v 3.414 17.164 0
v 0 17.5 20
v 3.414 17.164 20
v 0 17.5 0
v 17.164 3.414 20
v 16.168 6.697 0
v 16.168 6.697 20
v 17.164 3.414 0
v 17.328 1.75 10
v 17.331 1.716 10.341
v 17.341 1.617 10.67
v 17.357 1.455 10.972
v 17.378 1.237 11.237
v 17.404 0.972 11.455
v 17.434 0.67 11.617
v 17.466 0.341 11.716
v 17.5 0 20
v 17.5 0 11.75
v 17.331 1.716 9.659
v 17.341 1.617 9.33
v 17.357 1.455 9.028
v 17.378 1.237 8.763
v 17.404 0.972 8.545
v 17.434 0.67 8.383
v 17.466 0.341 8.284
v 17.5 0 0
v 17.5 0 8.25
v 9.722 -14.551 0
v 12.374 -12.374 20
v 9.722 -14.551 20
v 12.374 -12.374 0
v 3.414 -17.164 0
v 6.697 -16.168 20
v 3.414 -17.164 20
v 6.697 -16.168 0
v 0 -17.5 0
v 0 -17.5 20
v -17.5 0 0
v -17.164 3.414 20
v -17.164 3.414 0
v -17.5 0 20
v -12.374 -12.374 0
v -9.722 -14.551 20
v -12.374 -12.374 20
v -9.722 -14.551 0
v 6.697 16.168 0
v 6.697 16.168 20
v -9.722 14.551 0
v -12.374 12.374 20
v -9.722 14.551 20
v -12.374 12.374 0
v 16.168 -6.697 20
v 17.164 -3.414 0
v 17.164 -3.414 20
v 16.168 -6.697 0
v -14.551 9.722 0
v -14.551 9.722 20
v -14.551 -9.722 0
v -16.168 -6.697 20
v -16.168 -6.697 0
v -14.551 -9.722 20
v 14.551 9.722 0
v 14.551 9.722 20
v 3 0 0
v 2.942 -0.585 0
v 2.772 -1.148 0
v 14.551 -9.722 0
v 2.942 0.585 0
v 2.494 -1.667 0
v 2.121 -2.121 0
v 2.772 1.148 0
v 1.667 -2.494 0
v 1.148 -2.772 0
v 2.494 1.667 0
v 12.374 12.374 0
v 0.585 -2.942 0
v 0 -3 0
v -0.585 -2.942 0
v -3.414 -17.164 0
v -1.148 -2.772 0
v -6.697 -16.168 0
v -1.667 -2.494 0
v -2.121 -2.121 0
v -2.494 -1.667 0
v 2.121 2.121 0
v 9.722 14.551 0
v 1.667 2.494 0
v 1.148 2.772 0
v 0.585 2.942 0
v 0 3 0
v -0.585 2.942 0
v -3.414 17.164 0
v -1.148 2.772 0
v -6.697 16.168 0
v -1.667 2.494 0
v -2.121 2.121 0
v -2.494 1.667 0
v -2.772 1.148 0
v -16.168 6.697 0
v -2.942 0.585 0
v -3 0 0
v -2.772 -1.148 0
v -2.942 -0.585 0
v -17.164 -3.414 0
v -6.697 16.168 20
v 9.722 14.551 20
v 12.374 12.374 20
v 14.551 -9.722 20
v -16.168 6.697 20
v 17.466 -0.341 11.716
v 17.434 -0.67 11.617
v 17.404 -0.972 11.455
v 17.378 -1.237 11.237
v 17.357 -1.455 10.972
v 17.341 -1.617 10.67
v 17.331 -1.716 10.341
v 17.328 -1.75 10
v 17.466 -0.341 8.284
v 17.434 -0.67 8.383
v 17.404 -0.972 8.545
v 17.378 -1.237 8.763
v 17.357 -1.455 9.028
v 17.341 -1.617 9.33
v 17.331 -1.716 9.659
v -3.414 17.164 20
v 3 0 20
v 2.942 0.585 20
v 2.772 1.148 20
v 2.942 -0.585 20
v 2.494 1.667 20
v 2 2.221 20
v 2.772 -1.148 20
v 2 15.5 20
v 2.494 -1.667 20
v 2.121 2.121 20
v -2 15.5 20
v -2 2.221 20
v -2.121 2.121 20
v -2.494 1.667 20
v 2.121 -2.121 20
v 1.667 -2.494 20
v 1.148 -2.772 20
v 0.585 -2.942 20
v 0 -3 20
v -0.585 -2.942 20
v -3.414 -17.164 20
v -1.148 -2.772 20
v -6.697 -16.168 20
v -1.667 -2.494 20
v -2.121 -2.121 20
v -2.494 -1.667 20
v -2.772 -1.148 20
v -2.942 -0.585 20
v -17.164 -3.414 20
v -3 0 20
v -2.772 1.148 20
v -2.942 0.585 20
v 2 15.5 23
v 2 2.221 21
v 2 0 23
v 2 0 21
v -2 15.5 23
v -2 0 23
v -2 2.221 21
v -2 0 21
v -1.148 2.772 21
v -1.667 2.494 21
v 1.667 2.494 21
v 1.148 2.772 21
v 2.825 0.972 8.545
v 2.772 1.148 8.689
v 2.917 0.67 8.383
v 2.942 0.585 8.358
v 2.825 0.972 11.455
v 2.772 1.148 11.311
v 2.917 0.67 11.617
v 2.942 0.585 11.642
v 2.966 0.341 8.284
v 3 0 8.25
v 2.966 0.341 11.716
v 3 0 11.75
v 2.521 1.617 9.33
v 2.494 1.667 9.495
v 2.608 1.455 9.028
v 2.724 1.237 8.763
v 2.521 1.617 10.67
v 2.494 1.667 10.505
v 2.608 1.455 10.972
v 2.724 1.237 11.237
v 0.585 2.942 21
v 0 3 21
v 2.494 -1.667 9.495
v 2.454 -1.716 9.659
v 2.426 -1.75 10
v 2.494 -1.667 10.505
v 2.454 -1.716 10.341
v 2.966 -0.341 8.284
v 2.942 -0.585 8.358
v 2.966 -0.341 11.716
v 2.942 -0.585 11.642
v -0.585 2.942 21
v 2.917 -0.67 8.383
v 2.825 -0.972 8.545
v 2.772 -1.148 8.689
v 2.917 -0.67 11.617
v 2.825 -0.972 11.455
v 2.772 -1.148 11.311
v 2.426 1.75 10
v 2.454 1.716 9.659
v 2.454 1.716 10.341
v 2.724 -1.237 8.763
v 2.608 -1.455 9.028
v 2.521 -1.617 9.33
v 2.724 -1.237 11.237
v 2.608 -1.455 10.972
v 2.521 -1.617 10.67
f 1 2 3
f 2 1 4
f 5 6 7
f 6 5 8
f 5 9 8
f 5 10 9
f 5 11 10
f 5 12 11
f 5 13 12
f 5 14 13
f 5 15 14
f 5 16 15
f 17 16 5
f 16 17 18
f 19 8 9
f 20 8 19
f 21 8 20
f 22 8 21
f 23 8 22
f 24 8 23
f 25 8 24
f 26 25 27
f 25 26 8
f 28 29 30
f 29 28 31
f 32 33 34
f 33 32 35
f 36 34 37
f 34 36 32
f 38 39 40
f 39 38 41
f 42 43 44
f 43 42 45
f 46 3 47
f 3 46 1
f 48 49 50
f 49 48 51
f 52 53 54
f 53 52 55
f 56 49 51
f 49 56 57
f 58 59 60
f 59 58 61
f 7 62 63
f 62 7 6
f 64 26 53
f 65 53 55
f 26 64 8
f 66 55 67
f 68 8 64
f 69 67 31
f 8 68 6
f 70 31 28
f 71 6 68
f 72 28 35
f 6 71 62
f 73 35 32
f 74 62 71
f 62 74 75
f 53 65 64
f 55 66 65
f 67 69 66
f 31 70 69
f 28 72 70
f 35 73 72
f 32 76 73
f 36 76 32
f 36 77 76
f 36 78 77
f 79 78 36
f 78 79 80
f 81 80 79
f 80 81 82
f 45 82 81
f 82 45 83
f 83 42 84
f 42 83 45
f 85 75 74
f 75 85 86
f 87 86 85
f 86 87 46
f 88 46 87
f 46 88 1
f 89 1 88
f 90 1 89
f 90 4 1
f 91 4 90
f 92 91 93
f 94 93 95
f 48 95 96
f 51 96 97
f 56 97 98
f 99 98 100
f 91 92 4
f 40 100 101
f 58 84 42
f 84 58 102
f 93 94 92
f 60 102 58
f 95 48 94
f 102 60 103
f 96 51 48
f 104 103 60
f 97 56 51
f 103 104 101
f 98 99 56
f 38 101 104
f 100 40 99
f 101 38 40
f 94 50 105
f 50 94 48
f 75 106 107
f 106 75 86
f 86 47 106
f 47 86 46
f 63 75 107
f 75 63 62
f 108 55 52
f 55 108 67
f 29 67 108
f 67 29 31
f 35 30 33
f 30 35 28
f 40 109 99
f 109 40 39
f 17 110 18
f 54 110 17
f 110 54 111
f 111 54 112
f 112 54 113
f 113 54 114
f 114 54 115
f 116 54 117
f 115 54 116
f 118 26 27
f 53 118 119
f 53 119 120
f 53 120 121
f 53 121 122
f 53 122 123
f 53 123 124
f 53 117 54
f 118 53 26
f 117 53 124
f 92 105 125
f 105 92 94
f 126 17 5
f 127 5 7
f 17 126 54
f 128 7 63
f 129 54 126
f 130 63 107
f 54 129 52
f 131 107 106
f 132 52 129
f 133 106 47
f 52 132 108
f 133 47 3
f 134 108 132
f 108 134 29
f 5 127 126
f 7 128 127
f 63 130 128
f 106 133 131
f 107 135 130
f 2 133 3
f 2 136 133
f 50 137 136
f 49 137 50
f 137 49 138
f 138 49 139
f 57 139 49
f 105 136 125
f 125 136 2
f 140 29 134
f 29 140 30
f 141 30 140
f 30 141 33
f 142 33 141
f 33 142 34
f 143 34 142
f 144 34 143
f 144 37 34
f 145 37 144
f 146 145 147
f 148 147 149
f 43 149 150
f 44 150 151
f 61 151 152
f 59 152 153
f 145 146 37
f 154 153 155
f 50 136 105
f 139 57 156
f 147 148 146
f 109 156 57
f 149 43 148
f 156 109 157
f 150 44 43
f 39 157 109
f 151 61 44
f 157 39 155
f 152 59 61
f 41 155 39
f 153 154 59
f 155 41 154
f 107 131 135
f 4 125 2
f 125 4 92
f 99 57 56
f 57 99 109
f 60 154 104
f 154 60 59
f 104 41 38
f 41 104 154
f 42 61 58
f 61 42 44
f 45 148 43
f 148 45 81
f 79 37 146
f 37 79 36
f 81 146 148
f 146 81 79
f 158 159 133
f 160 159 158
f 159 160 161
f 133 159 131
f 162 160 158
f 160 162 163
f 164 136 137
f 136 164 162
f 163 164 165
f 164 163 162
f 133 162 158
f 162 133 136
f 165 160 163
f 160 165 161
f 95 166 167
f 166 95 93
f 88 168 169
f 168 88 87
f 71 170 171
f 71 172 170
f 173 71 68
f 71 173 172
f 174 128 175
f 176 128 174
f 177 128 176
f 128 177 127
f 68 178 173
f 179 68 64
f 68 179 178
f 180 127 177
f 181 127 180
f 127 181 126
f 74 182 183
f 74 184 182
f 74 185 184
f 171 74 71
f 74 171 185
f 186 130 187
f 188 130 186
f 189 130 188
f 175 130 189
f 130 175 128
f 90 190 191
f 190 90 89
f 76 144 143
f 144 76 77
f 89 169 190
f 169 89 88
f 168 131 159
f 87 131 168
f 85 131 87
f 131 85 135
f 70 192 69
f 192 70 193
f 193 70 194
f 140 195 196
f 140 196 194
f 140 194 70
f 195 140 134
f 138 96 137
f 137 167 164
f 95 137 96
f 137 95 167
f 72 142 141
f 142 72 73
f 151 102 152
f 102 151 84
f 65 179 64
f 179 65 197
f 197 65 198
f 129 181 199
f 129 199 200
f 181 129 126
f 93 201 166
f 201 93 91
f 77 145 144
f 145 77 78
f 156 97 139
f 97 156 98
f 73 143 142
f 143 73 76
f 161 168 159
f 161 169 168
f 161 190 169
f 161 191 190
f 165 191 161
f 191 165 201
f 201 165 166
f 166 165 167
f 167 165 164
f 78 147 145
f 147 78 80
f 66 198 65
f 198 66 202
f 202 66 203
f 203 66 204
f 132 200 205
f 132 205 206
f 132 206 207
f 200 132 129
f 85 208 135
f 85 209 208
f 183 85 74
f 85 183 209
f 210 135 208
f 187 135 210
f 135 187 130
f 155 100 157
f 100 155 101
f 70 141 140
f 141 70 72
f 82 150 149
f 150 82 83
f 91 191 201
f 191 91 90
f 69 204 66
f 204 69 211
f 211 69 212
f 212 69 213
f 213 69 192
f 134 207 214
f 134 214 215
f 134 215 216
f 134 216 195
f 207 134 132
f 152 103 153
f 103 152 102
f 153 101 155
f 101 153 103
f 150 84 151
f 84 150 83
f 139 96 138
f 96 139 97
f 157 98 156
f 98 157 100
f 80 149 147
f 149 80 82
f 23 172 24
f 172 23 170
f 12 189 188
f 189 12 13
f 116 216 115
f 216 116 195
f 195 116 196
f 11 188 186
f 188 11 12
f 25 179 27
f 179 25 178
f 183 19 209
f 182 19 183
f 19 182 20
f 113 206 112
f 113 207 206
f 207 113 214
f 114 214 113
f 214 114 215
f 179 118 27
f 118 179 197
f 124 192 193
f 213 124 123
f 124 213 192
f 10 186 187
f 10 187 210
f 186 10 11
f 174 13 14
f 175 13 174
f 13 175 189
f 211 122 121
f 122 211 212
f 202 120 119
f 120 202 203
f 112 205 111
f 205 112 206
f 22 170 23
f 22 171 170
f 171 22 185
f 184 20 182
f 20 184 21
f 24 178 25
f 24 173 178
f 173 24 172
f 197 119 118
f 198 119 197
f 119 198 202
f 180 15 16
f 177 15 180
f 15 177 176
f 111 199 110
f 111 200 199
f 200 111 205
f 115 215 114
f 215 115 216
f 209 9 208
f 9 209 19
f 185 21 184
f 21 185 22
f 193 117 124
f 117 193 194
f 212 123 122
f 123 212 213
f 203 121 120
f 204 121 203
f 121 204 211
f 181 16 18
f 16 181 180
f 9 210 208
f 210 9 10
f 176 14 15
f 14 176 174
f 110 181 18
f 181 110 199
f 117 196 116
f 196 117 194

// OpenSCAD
$fn = 32;

// ----------------------------------------------------------------------
// Control knob: pointer knob
// ----------------------------------------------------------------------

// --- parameters (mm) ---
rib_w = 4;                // pointer rib width
rib_h = 4;                // pointer rib height
knob_d = 35;              // knob body diameter
knob_h = 20;              // knob body height
bore_d = 6;               // shaft bore diameter
set_d = 3.5;              // set screw bore diameter
fit_tol = 0.1;            // tolerance for press fits, mm
free_tol = 0.3;           // tolerance for clearance fits, mm

rib_poke = rib_h - 1;  // rib height above the top
total_h = knob_h + rib_h - 1;  // overall height

difference() {
  union() {
    cylinder(h = knob_h, d = knob_d);
    translate([-rib_w / 2, 0, knob_h - 1])
      cube([rib_w, knob_d / 2 - 2, rib_h]);
  }
  translate([0, 0, -1]) cylinder(h = knob_h + 2, d = bore_d);
  translate([-1, 0, knob_h / 2]) rotate([0, 90, 0])
    cylinder(h = knob_d / 2 + bore_d / 2 + 2, d = set_d);}
